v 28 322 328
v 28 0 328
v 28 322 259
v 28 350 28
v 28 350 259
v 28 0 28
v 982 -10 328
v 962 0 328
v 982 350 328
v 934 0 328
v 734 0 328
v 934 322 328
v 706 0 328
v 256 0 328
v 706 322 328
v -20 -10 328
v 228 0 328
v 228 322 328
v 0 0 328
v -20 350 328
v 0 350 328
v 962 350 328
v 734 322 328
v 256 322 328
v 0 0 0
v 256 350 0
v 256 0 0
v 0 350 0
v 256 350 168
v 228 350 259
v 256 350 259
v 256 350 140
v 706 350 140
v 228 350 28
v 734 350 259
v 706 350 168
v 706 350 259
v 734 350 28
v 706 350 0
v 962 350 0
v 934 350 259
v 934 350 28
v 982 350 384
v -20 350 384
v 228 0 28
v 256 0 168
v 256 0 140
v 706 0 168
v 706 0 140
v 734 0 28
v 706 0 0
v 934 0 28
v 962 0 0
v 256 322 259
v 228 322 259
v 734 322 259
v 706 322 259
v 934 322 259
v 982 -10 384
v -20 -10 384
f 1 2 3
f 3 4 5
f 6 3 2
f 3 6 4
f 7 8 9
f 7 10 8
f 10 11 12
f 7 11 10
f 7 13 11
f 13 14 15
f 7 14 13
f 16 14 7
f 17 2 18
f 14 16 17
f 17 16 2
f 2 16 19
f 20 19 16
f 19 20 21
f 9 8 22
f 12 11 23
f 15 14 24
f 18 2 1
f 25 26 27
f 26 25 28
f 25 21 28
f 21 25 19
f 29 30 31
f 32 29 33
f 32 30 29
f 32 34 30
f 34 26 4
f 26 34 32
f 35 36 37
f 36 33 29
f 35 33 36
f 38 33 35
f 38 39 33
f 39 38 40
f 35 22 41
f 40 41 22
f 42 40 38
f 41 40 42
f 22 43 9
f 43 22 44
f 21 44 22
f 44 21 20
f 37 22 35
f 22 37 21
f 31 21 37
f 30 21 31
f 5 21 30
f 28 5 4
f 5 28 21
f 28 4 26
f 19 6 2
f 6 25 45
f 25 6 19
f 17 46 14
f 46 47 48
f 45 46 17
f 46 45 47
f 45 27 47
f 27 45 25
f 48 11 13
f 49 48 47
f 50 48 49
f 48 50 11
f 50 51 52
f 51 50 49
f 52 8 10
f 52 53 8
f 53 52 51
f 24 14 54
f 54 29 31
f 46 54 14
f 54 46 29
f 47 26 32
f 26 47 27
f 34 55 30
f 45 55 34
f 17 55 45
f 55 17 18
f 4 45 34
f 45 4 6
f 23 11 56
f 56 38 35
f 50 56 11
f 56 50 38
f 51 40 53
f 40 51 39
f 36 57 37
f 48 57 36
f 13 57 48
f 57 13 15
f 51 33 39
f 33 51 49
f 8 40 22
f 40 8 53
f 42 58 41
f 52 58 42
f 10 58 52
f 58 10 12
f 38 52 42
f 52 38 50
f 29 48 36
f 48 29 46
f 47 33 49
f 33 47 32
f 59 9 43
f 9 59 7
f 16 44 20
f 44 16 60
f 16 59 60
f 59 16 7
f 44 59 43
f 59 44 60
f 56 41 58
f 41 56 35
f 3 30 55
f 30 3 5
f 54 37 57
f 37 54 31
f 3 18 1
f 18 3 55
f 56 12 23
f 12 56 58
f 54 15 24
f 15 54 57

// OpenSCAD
/* List of meterials

# Done
2* speakerWidth
    *speakerLength
1* amplifierLength
    *amplifierWidth
4* speakerHeight
    *speakerLength,
    (328*350)
2* topWidth
    *topLength,
    (1002*360)
    
# Not done

*/

oakThicknes = 28;
speakerWidth = 200;
speakerHeight = 300
    +oakThicknes;
speakerLength = 350; 
amplifierWidth = 450;
amplifierHeight = 160;
amplifierLength = speakerLength;
topExtensionWidth = 20;
topExtensionLength = 10;
topWidth = speakerWidth*2 
    + amplifierWidth
    + oakThicknes*4
    + topExtensionWidth*2;
topLength = speakerLength
    +topExtensionLength;
wallmountWith = 69;
wallmountLength = speakerWidth*2 
    + amplifierWidth
    + oakThicknes*2;

// speaker box 1 left side 
cube(size = [oakThicknes,
    speakerLength,
    speakerHeight]);

// speaker box 1 right side 
translate([
    oakThicknes+speakerWidth,
    0,
    0]) 
    cube(size = [oakThicknes,
    speakerLength,
    speakerHeight]);

// speaker box 1 bottom 
translate([
    oakThicknes,
    0,
    0]) 
    cube(size = [speakerWidth,
    speakerLength,
    oakThicknes]);
    
// speaker box 2 left side 
translate([     
    oakThicknes*2+speakerWidth
    +amplifierWidth,
    0,
    0]) 
    cube(size = [oakThicknes,
    speakerLength,
    speakerHeight]);
    
// speaker box 2 right side 
translate([     
    oakThicknes*3+speakerWidth*2
    +amplifierWidth,
    0,
    0]) 
    cube(size = [oakThicknes,
    speakerLength,
    speakerHeight]);

// speaker box 2 bottom 
translate([
    oakThicknes*3+speakerWidth
    +amplifierWidth,
    0,
    0]) 
    cube(size = [speakerWidth,
    speakerLength,
    oakThicknes]);
    
// amplifier shelf
translate([
    oakThicknes*2+speakerWidth,
    0,
    speakerHeight-oakThicknes
    -amplifierHeight]) 
    cube(size = [amplifierWidth,
    amplifierLength,
    oakThicknes]);
    
// top solid
translate([
    -topExtensionWidth,
    -topExtensionLength,
    speakerHeight]) 
    cube(size = [topWidth,
    topLength,
    oakThicknes]);


// top foldebal

translate([
    -topExtensionWidth,
    -topExtensionLength,
    oakThicknes+speakerHeight]) 
    cube(size = [topWidth,
    topLength,
    oakThicknes]);
/*
// top folded
translate([
    -topExtensionWidth,
    -topLength
    -topExtensionLength,
    speakerHeight]) 
    cube(size = [topWidth,
    topLength,
    oakThicknes]);
*/
// wallmount
translate([
    oakThicknes,
    speakerLength-oakThicknes,
    speakerHeight-wallmountWith]) 
    cube(size = [
    wallmountLength,
    oakThicknes,
    wallmountWith]);
